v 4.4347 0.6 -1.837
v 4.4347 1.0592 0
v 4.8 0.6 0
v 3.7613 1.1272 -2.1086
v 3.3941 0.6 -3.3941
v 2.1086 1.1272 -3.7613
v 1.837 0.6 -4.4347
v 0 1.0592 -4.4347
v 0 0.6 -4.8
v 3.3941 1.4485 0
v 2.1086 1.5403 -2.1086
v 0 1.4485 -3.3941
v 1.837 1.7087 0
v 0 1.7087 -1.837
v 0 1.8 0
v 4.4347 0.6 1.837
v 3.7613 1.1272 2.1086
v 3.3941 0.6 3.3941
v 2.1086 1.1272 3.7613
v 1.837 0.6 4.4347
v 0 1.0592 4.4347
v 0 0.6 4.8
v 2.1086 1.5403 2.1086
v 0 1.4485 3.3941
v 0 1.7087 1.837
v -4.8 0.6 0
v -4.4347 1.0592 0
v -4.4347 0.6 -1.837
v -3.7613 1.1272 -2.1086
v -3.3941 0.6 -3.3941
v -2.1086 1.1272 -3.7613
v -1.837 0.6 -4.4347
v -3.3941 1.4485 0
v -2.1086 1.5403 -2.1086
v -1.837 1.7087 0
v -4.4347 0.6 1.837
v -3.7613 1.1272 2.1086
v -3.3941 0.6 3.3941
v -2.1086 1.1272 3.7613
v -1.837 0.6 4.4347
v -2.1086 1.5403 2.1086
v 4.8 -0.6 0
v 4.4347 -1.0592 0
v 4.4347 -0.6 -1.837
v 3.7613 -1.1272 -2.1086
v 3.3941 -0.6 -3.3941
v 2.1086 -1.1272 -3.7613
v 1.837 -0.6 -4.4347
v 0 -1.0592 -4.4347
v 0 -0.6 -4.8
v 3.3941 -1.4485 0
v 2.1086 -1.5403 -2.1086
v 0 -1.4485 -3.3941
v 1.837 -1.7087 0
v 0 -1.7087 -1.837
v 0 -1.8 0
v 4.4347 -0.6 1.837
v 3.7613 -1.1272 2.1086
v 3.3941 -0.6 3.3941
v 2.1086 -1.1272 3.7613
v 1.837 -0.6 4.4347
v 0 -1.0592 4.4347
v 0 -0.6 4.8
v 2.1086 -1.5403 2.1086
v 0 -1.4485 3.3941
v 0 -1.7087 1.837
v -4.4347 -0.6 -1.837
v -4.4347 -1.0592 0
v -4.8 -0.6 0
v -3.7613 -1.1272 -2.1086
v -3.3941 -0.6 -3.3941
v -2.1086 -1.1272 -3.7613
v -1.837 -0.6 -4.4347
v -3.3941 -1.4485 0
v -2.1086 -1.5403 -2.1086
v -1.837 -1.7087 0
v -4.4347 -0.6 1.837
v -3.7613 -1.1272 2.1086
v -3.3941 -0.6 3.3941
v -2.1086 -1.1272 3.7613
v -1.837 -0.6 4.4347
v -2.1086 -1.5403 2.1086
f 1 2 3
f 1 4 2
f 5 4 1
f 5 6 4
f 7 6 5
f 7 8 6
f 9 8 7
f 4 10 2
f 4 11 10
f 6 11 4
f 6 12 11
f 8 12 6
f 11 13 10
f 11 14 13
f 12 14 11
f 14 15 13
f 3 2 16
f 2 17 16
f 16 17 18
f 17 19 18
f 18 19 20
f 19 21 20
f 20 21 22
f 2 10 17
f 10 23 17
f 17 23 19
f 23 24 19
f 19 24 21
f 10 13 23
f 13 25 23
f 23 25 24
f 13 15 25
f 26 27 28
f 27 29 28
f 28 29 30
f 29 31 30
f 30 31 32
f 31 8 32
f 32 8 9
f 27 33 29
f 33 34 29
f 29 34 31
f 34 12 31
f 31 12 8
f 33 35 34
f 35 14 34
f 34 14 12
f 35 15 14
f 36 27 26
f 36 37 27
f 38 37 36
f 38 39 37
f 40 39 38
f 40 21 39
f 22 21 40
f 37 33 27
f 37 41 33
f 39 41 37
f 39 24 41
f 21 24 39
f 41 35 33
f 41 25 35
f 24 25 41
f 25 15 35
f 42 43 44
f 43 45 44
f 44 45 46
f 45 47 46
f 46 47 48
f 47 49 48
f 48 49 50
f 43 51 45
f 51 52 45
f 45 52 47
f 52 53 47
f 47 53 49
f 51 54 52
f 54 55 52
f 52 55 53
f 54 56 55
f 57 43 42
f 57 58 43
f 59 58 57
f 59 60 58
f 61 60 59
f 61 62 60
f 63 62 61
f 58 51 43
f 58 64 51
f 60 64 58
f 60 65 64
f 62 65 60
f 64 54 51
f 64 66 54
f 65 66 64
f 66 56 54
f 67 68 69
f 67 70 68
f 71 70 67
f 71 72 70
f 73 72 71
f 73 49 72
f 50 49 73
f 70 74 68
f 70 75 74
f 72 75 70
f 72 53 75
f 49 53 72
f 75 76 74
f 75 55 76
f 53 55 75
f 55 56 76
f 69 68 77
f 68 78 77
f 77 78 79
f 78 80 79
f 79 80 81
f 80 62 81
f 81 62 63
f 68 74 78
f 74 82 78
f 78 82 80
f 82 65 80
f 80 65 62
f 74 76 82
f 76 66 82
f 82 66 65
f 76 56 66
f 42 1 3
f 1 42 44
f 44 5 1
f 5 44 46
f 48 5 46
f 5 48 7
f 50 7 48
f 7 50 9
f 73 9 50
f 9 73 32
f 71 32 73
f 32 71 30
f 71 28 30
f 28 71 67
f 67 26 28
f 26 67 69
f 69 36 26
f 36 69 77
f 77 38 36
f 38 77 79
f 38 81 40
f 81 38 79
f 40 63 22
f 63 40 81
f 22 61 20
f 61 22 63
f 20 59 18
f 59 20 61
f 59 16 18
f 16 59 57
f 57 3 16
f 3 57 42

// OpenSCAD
// file: ../../p/4-4disc.scad
use <../lib.scad>
$fa=1; $fs=0.2;
function ldraw_lib__4_4disc(realsolid=false) = [
// 0 Disc 1.0
// 0 Name: 4-4disc.dat
// 0 Author: James Jessiman
// 0 !LDRAW_ORG Primitive UPDATE 2002-02
// 0 !LICENSE Licensed under CC BY 2.0 and CC BY 4.0 : see CAreadme.txt
// 
// 0 BFC CERTIFY CCW
  [0,"BFC","CERTIFY"],
  [0,"BFC","CCW"],
// 
// 0 !HISTORY 1998-12-15 [PTadmin] Official Update 1998-10
// 0 !HISTORY 2002-03-23 [sbliss] Added BFC statement
// 0 !HISTORY 2002-04-25 [PTadmin] Official Update 2002-02
// 0 !HISTORY 2007-06-24 [PTadmin] Header formatted for Contributor Agreement
// 0 !HISTORY 2008-07-01 [PTadmin] Official Update 2008-01
// 
// 
// 3 16 0 0 0 1 0 0 0.9239 0 0.3827
  [3,16,0,0,0,1,0,0,0.9239,0,0.3827],
// 3 16 0 0 0 0.9239 0 0.3827 0.7071 0 0.7071
  [3,16,0,0,0,0.9239,0,0.3827,0.7071,0,0.7071],
// 3 16 0 0 0 0.7071 0 0.7071 0.3827 0 0.9239
  [3,16,0,0,0,0.7071,0,0.7071,0.3827,0,0.9239],
// 3 16 0 0 0 0.3827 0 0.9239 0 0 1
  [3,16,0,0,0,0.3827,0,0.9239,0,0,1],
// 3 16 0 0 0 0 0 1 -0.3827 0 0.9239
  [3,16,0,0,0,0,0,1,-0.3827,0,0.9239],
// 3 16 0 0 0 -0.3827 0 0.9239 -0.7071 0 0.7071
  [3,16,0,0,0,-0.3827,0,0.9239,-0.7071,0,0.7071],
// 3 16 0 0 0 -0.7071 0 0.7071 -0.9239 0 0.3827
  [3,16,0,0,0,-0.7071,0,0.7071,-0.9239,0,0.3827],
// 3 16 0 0 0 -0.9239 0 0.3827 -1 0 -0
  [3,16,0,0,0,-0.9239,0,0.3827,-1,0,-0],
// 3 16 0 0 0 -1 0 -0 -0.9239 0 -0.3827
  [3,16,0,0,0,-1,0,-0,-0.9239,0,-0.3827],
// 3 16 0 0 0 -0.9239 0 -0.3827 -0.7071 0 -0.7071
  [3,16,0,0,0,-0.9239,0,-0.3827,-0.7071,0,-0.7071],
// 3 16 0 0 0 -0.7071 0 -0.7071 -0.3827 0 -0.9239
  [3,16,0,0,0,-0.7071,0,-0.7071,-0.3827,0,-0.9239],
// 3 16 0 0 0 -0.3827 0 -0.9239 0 0 -1
  [3,16,0,0,0,-0.3827,0,-0.9239,0,0,-1],
// 3 16 0 0 0 0 0 -1 0.3827 0 -0.9239
  [3,16,0,0,0,0,0,-1,0.3827,0,-0.9239],
// 3 16 0 0 0 0.3827 0 -0.9239 0.7071 0 -0.7071
  [3,16,0,0,0,0.3827,0,-0.9239,0.7071,0,-0.7071],
// 3 16 0 0 0 0.7071 0 -0.7071 0.9239 0 -0.3827
  [3,16,0,0,0,0.7071,0,-0.7071,0.9239,0,-0.3827],
// 3 16 0 0 0 0.9239 0 -0.3827 1 0 0
  [3,16,0,0,0,0.9239,0,-0.3827,1,0,0],
// 0
];
module ldraw_lib__4_4disc(step=0, col=false, unit=2/5, alt=false, line=0.2, solid=!$preview)
    makepoly(ldraw_lib__4_4disc(solid), step=step, col=col, unit=unit, alt=alt, line=line, solid=solid);
ldraw_lib__4_4disc(line=0.2);
// file: ../../p/stud3.scad
use <../lib.scad>
use <4-4cyli.scad>
use <4-4disc.scad>
use <4-4edge.scad>
$fa=1; $fs=0.2;
function ldraw_lib__stud3(realsolid=false) = realsolid ? 
    [openscad(translate([0,0,-eps()], o=cylinder(4+eps(), r=4)),2)] : [
// 0 Stud Tube Solid
// 0 Name: stud3.dat
// 0 Author: James Jessiman
// 0 !LDRAW_ORG Primitive UPDATE 2012-01
// 0 !LICENSE Licensed under CC BY 2.0 and CC BY 4.0 : see CAreadme.txt
// 
// 0 BFC CERTIFY CCW
  [0,"BFC","CERTIFY"],
  [0,"BFC","CCW"],
// 
// 0 !HISTORY 2002-04-04 [sbliss] Modified for BFC compliance
// 0 !HISTORY 2002-04-25 [PTadmin] Official Update 2002-02
// 0 !HISTORY 2007-06-24 [PTadmin] Header formatted for Contributor Agreement
// 0 !HISTORY 2008-07-01 [PTadmin] Official Update 2008-01
// 0 !HISTORY 2012-02-16 [Philo] Changed to CCW
// 0 !HISTORY 2012-03-30 [PTadmin] Official Update 2012-01
// 
// 
// 1 16 0 -4 0 4 0 0 0 1 0 0 0 4 4-4edge.dat
  [1,16,0,-4,0,4,0,0,0,1,0,0,0,4, ldraw_lib__4_4edge(realsolid)],
// 1 16 0 0 0 4 0 0 0 1 0 0 0 4 4-4edge.dat
  [1,16,0,0,0,4,0,0,0,1,0,0,0,4, ldraw_lib__4_4edge(realsolid)],
// 1 16 0 -4 0 4 0 0 0 1 0 0 0 4 4-4disc.dat
  [1,16,0,-4,0,4,0,0,0,1,0,0,0,4, ldraw_lib__4_4disc(realsolid)],
// 1 16 0 -4 0 4 0 0 0 4 0 0 0 4 4-4cyli.dat
  [1,16,0,-4,0,4,0,0,0,4,0,0,0,4, ldraw_lib__4_4cyli(realsolid)],
];
module ldraw_lib__stud3(step=0, col=false, unit=2/5, alt=false, line=0.2, solid=!$preview)
    makepoly(ldraw_lib__stud3(solid), step=step, col=col, unit=unit, alt=alt, line=line, solid=solid);
ldraw_lib__stud3(line=0.2);
// file: ../../p/stud.scad
use <../lib.scad>
use <4-4cyli.scad>
use <4-4disc.scad>
use <4-4edge.scad>
$fa=1; $fs=0.2;
function ldraw_lib__stud(realsolid=false) = realsolid ? 
    [openscad(translate([0,0,-eps()], o=cylinder(4+eps(), r=6)),2)] : [
// 0 Stud
// 0 Name: stud.dat
// 0 Author: James Jessiman
// 0 !LDRAW_ORG Primitive UPDATE 2012-01
// 0 !LICENSE Licensed under CC BY 2.0 and CC BY 4.0 : see CAreadme.txt
// 
// 0 BFC CERTIFY CCW
  [0,"BFC","CERTIFY"],
  [0,"BFC","CCW"],
// 
// 0 !HISTORY 2002-04-04 [sbliss] Modified for BFC compliance
// 0 !HISTORY 2002-04-25 [PTadmin] Official Update 2002-02
// 0 !HISTORY 2007-06-24 [PTadmin] Header formatted for Contributor Agreement
// 0 !HISTORY 2008-07-01 [PTadmin] Official Update 2008-01
// 0 !HISTORY 2012-02-16 [Philo] Changed to CCW
// 0 !HISTORY 2012-03-30 [PTadmin] Official Update 2012-01
// 
// 
// 1 16 0 0 0 6 0 0 0 1 0 0 0 6 4-4edge.dat
  [1,16,0,0,0,6,0,0,0,1,0,0,0,6, ldraw_lib__4_4edge(realsolid)],
// 1 16 0 -4 0 6 0 0 0 1 0 0 0 6 4-4edge.dat
  [1,16,0,-4,0,6,0,0,0,1,0,0,0,6, ldraw_lib__4_4edge(realsolid)],
// 1 16 0 0 0 6 0 0 0 -4 0 0 0 6 4-4cyli.dat
  [1,16,0,0,0,6,0,0,0,-4,0,0,0,6, ldraw_lib__4_4cyli(realsolid)],
// 1 16 0 -4 0 6 0 0 0 1 0 0 0 6 4-4disc.dat
  [1,16,0,-4,0,6,0,0,0,1,0,0,0,6, ldraw_lib__4_4disc(realsolid)],
];
module ldraw_lib__stud(step=0, col=false, unit=2/5, alt=false, line=0.2, solid=!$preview)
    makepoly(ldraw_lib__stud(solid), step=step, col=col, unit=unit, alt=alt, line=line, solid=solid);
ldraw_lib__stud(line=0.2);
// file: ../../p/box5.scad
use <../lib.scad>
$fa=1; $fs=0.2;
function ldraw_lib__box5(realsolid=false) = [
// 0 Box with 5 Faces and All Edges
// 0 Name: box5.dat
// 0 Author: James Jessiman
// 0 !LDRAW_ORG Primitive UPDATE 2012-01
// 0 !LICENSE Licensed under CC BY 2.0 and CC BY 4.0 : see CAreadme.txt
// 
// 0 BFC CERTIFY CCW
  [0,"BFC","CERTIFY"],
  [0,"BFC","CCW"],
// 
// 0 !HISTORY 2002-04-03 [sbliss] Modified for BFC compliance
// 0 !HISTORY 2002-04-25 [PTadmin] Official Update 2002-02
// 0 !HISTORY 2007-06-24 [PTadmin] Header formatted for Contributor Agreement
// 0 !HISTORY 2008-07-01 [PTadmin] Official Update 2008-01
// 0 !HISTORY 2012-02-16 [Philo] Changed to CCW
// 0 !HISTORY 2012-03-30 [PTadmin] Official Update 2012-01
// 
// 
// 2 24 1 1 1 -1 1 1
  [2,24,1,1,1,-1,1,1],
// 2 24 -1 1 1 -1 1 -1
  [2,24,-1,1,1,-1,1,-1],
// 2 24 -1 1 -1 1 1 -1
  [2,24,-1,1,-1,1,1,-1],
// 2 24 1 1 -1 1 1 1
  [2,24,1,1,-1,1,1,1],
// 2 24 1 0 1 -1 0 1
  [2,24,1,0,1,-1,0,1],
// 2 24 -1 0 1 -1 0 -1
  [2,24,-1,0,1,-1,0,-1],
// 2 24 -1 0 -1 1 0 -1
  [2,24,-1,0,-1,1,0,-1],
// 2 24 1 0 -1 1 0 1
  [2,24,1,0,-1,1,0,1],
// 2 24 1 0 1 1 1 1
  [2,24,1,0,1,1,1,1],
// 2 24 -1 0 1 -1 1 1
  [2,24,-1,0,1,-1,1,1],
// 2 24 1 0 -1 1 1 -1
  [2,24,1,0,-1,1,1,-1],
// 2 24 -1 0 -1 -1 1 -1
  [2,24,-1,0,-1,-1,1,-1],
// 4 16 -1 1 1 1 1 1 1 1 -1 -1 1 -1
  [4,16,-1,1,1,1,1,1,1,1,-1,-1,1,-1],
// 4 16 -1 1 1 -1 0 1 1 0 1 1 1 1
  [4,16,-1,1,1,-1,0,1,1,0,1,1,1,1],
// 4 16 -1 1 -1 -1 0 -1 -1 0 1 -1 1 1
  [4,16,-1,1,-1,-1,0,-1,-1,0,1,-1,1,1],
// 4 16 1 1 -1 1 0 -1 -1 0 -1 -1 1 -1
  [4,16,1,1,-1,1,0,-1,-1,0,-1,-1,1,-1],
// 4 16 1 1 1 1 0 1 1 0 -1 1 1 -1
  [4,16,1,1,1,1,0,1,1,0,-1,1,1,-1],
];
module ldraw_lib__box5(step=0, col=false, unit=2/5, alt=false, line=0.2, solid=!$preview)
    makepoly(ldraw_lib__box5(solid), step=step, col=col, unit=unit, alt=alt, line=line, solid=solid);
ldraw_lib__box5(line=0.2);
// file: ../../p/box4t.scad
use <../lib.scad>
$fa=1; $fs=0.2;
function ldraw_lib__box4t(realsolid=false) = [
// 0 Box with 4 Adjacent Faces and All Edges
// 0 Name: box4t.dat
// 0 Author: Tore Eriksson [Tore_Eriksson]
// 0 !LDRAW_ORG Primitive UPDATE 2003-02
// 0 !LICENSE Licensed under CC BY 2.0 and CC BY 4.0 : see CAreadme.txt
// 
// 0 BFC CERTIFY CCW
  [0,"BFC","CERTIFY"],
  [0,"BFC","CCW"],
// 
// 0 !HISTORY 1997-09-29 [PTadmin] Official Update 1997-15
// 0 !HISTORY 2002-08-31 [izanette] Modified with WINDZ for BFC compliance
// 0 !HISTORY 2003-08-01 [PTadmin] Official Update 2003-02
// 0 !HISTORY 2007-06-24 [PTadmin] Header formatted for Contributor Agreement
// 0 !HISTORY 2008-07-01 [PTadmin] Official Update 2008-01
// 
// 
// 2 24 1 1 1 -1 1 1
  [2,24,1,1,1,-1,1,1],
// 2 24 -1 1 1 -1 1 -1
  [2,24,-1,1,1,-1,1,-1],
// 2 24 -1 1 -1 1 1 -1
  [2,24,-1,1,-1,1,1,-1],
// 2 24 1 1 -1 1 1 1
  [2,24,1,1,-1,1,1,1],
// 2 24 1 0 1 -1 0 1
  [2,24,1,0,1,-1,0,1],
// 2 24 -1 0 1 -1 0 -1
  [2,24,-1,0,1,-1,0,-1],
// 2 24 -1 0 -1 1 0 -1
  [2,24,-1,0,-1,1,0,-1],
// 2 24 1 0 -1 1 0 1
  [2,24,1,0,-1,1,0,1],
// 2 24 1 0 1 1 1 1
  [2,24,1,0,1,1,1,1],
// 2 24 -1 0 1 -1 1 1
  [2,24,-1,0,1,-1,1,1],
// 2 24 1 0 -1 1 1 -1
  [2,24,1,0,-1,1,1,-1],
// 2 24 -1 0 -1 -1 1 -1
  [2,24,-1,0,-1,-1,1,-1],
// 4 16 1 1 1 1 1 -1 -1 1 -1 -1 1 1
  [4,16,1,1,1,1,1,-1,-1,1,-1,-1,1,1],
// 4 16 1 1 1 -1 1 1 -1 0 1 1 0 1
  [4,16,1,1,1,-1,1,1,-1,0,1,1,0,1],
// 4 16 -1 1 1 -1 1 -1 -1 0 -1 -1 0 1
  [4,16,-1,1,1,-1,1,-1,-1,0,-1,-1,0,1],
// 0 4 16 -1 1 -1 -1 0 -1 1 0 -1 1 1 -1
// 4 16 1 1 -1 1 1 1 1 0 1 1 0 -1
  [4,16,1,1,-1,1,1,1,1,0,1,1,0,-1],
// 0
];
module ldraw_lib__box4t(step=0, col=false, unit=2/5, alt=false, line=0.2, solid=!$preview)
    makepoly(ldraw_lib__box4t(solid), step=step, col=col, unit=unit, alt=alt, line=line, solid=solid);
ldraw_lib__box4t(line=0.2);
// file: 3004s01.scad
use <../../lib.scad>
use <../../p/box4t.scad>
use <../../p/box5.scad>
use <../../p/stud.scad>
use <../../p/stud3.scad>
$fa=1; $fs=0.2;
function ldraw_lib__s__3004s01(realsolid=false) = [
// 0 ~Brick  1 x  2 without Front Face
// 0 Name: s\3004s01.dat
// 0 Author: James Jessiman
// 0 !LDRAW_ORG Subpart UPDATE 2003-03
// 0 !LICENSE Licensed under CC BY 2.0 and CC BY 4.0 : see CAreadme.txt
// 
// 0 BFC CERTIFY CCW
  [0,"BFC","CERTIFY"],
  [0,"BFC","CCW"],
// 
// 0 !HISTORY 2003-09-07 [jriley] Subfiling, BFC
// 0 !HISTORY 2003-12-19 [PTadmin] Official Update 2003-03
// 0 !HISTORY 2007-08-29 [PTadmin] Header formatted for Contributor Agreement
// 0 !HISTORY 2008-07-01 [PTadmin] Official Update 2008-01
// 
// 
// 1 16 0 4 0 1 0 0 0 -5 0 0 0 1 stud3.dat
  [1,16,0,4,0,1,0,0,0,-5,0,0,0,1, ldraw_lib__stud3(realsolid)],
// 0 BFC INVERTNEXT
  [0,"BFC","INVERTNEXT"],
// 1 16 0 24 0 16 0 0 0 -20 0 0 0 6 box5.dat
  [1,16,0,24,0,16,0,0,0,-20,0,0,0,6, ldraw_lib__box5(realsolid)],
// 4 16 20 24 10 16 24 6 -16 24 6 -20 24 10
  [4,16,20,24,10,16,24,6,-16,24,6,-20,24,10],
// 4 16 -20 24 10 -16 24 6 -16 24 -6 -20 24 -10
  [4,16,-20,24,10,-16,24,6,-16,24,-6,-20,24,-10],
// 4 16 -20 24 -10 -16 24 -6 16 24 -6 20 24 -10
  [4,16,-20,24,-10,-16,24,-6,16,24,-6,20,24,-10],
// 4 16 20 24 -10 16 24 -6 16 24 6 20 24 10
  [4,16,20,24,-10,16,24,-6,16,24,6,20,24,10],
// 1 16 0 24 0 20 0 0 0 -24 0 0 0 10 box4t.dat
  [1,16,0,24,0,20,0,0,0,-24,0,0,0,10, ldraw_lib__box4t(realsolid)],
// 1 16 10 0 0 1 0 0 0 1 0 0 0 1 stud.dat
  [1,16,10,0,0,1,0,0,0,1,0,0,0,1, ldraw_lib__stud(realsolid)],
// 1 16 -10 0 0 1 0 0 0 1 0 0 0 1 stud.dat
  [1,16,-10,0,0,1,0,0,0,1,0,0,0,1, ldraw_lib__stud(realsolid)],
// 0
];
module ldraw_lib__s__3004s01(step=0, col=false, unit=2/5, alt=false, line=0.2, solid=!$preview)
    makepoly(ldraw_lib__s__3004s01(solid), step=step, col=col, unit=unit, alt=alt, line=line, solid=solid);
ldraw_lib__s__3004s01(line=0.2);
// file: ../../p/1-8sphe.scad
use <../lib.scad>
$fa=1; $fs=0.2;
function ldraw_lib__1_8sphe(realsolid=false) = [
// 0 Sphere 0.125
// 0 Name: 1-8sphe.dat
// 0 Author: James Jessiman
// 0 !LDRAW_ORG Primitive UPDATE 2012-03
// 0 !LICENSE Licensed under CC BY 2.0 and CC BY 4.0 : see CAreadme.txt
// 
// 0 BFC CERTIFY CCW
  [0,"BFC","CERTIFY"],
  [0,"BFC","CCW"],
// 
// 0 !HISTORY 2000-08-01 {Axel Poque} fixes to resolve L3P error messages.
// 0 !HISTORY 2000-08-01 {Manfred Moolhuysen} fixes to resolve L3P error messages.
// 0 !HISTORY 2000-09-30 [PTadmin] Official Update 2000-02
// 0 !HISTORY 2002-03-28 [hafhead] Made BFC compliant
// 0 !HISTORY 2002-04-25 [PTadmin] Official Update 2002-02
// 0 !HISTORY 2007-06-22 [PTadmin] Header formatted for Contributor Agreement
// 0 !HISTORY 2008-07-01 [PTadmin] Official Update 2008-01
// 0 !HISTORY 2010-09-12 [MagFors] Changed winding, removed duplicated cond-line, optimized filesize
// 0 !HISTORY 2010-12-31 [PTadmin] Official Update 2010-03
// 0 !HISTORY 2012-07-01 [tcobbs] Replaced with geometry from LDView
// 0 !HISTORY 2012-12-28 [PTadmin] Official Update 2012-03
// 
// 
// 3 16 1 0 0 0.9239 0.3827 0 0.9239 0 0.3827
  [3,16,1,0,0,0.9239,0.3827,0,0.9239,0,0.3827],
// 3 16 0.9239 0.3827 0 0.7836 0.4393 0.4393 0.9239 0 0.3827
  [3,16,0.9239,0.3827,0,0.7836,0.4393,0.4393,0.9239,0,0.3827],
// 3 16 0.9239 0 0.3827 0.7836 0.4393 0.4393 0.7071 0 0.7071
  [3,16,0.9239,0,0.3827,0.7836,0.4393,0.4393,0.7071,0,0.7071],
// 3 16 0.7836 0.4393 0.4393 0.4393 0.4393 0.7836 0.7071 0 0.7071
  [3,16,0.7836,0.4393,0.4393,0.4393,0.4393,0.7836,0.7071,0,0.7071],
// 3 16 0.7071 0 0.7071 0.4393 0.4393 0.7836 0.3827 0 0.9239
  [3,16,0.7071,0,0.7071,0.4393,0.4393,0.7836,0.3827,0,0.9239],
// 3 16 0.4393 0.4393 0.7836 0 0.3827 0.9239 0.3827 0 0.9239
  [3,16,0.4393,0.4393,0.7836,0,0.3827,0.9239,0.3827,0,0.9239],
// 3 16 0.3827 0 0.9239 0 0.3827 0.9239 0 0 1
  [3,16,0.3827,0,0.9239,0,0.3827,0.9239,0,0,1],
// 3 16 0.9239 0.3827 0 0.7071 0.7071 0 0.7836 0.4393 0.4393
  [3,16,0.9239,0.3827,0,0.7071,0.7071,0,0.7836,0.4393,0.4393],
// 3 16 0.7071 0.7071 0 0.4393 0.7836 0.4393 0.7836 0.4393 0.4393
  [3,16,0.7071,0.7071,0,0.4393,0.7836,0.4393,0.7836,0.4393,0.4393],
// 3 16 0.7836 0.4393 0.4393 0.4393 0.7836 0.4393 0.4393 0.4393 0.7836
  [3,16,0.7836,0.4393,0.4393,0.4393,0.7836,0.4393,0.4393,0.4393,0.7836],
// 3 16 0.4393 0.7836 0.4393 0 0.7071 0.7071 0.4393 0.4393 0.7836
  [3,16,0.4393,0.7836,0.4393,0,0.7071,0.7071,0.4393,0.4393,0.7836],
// 3 16 0.4393 0.4393 0.7836 0 0.7071 0.7071 0 0.3827 0.9239
  [3,16,0.4393,0.4393,0.7836,0,0.7071,0.7071,0,0.3827,0.9239],
// 3 16 0.7071 0.7071 0 0.3827 0.9239 0 0.4393 0.7836 0.4393
  [3,16,0.7071,0.7071,0,0.3827,0.9239,0,0.4393,0.7836,0.4393],
// 3 16 0.3827 0.9239 0 0 0.9239 0.3827 0.4393 0.7836 0.4393
  [3,16,0.3827,0.9239,0,0,0.9239,0.3827,0.4393,0.7836,0.4393],
// 3 16 0.4393 0.7836 0.4393 0 0.9239 0.3827 0 0.7071 0.7071
  [3,16,0.4393,0.7836,0.4393,0,0.9239,0.3827,0,0.7071,0.7071],
// 3 16 0.3827 0.9239 0 0 1 0 0 0.9239 0.3827
  [3,16,0.3827,0.9239,0,0,1,0,0,0.9239,0.3827],
// 
// 5 24 1 0 0 0.9239 0.3827 0 1 0 -0.1 0.9239 0 0.3827
  [5,24,1,0,0,0.9239,0.3827,0,1,0,-0.1,0.9239,0,0.3827],
// 5 24 0.9239 0.3827 0 0.9239 0 0.3827 1 0 0 0.7836 0.4393 0.4393
  [5,24,0.9239,0.3827,0,0.9239,0,0.3827,1,0,0,0.7836,0.4393,0.4393],
// 5 24 1 0 0 0.9239 0 0.3827 0.9239 0.3827 0 1 -0.1 0
  [5,24,1,0,0,0.9239,0,0.3827,0.9239,0.3827,0,1,-0.1,0],
// 5 24 0.9239 0 0.3827 0.7836 0.4393 0.4393 0.9239 0.3827 0 0.7071 0 0.7071
  [5,24,0.9239,0,0.3827,0.7836,0.4393,0.4393,0.9239,0.3827,0,0.7071,0,0.7071],
// 5 24 0.7836 0.4393 0.4393 0.7071 0 0.7071 0.9239 0 0.3827 0.4393 0.4393 0.7836
  [5,24,0.7836,0.4393,0.4393,0.7071,0,0.7071,0.9239,0,0.3827,0.4393,0.4393,0.7836],
// 5 24 0.9239 0 0.3827 0.7071 0 0.7071 0.7836 0.4393 0.4393 0.9239 -0.1 0.3827
  [5,24,0.9239,0,0.3827,0.7071,0,0.7071,0.7836,0.4393,0.4393,0.9239,-0.1,0.3827],
// 5 24 0.7071 0 0.7071 0.4393 0.4393 0.7836 0.7836 0.4393 0.4393 0.3827 0 0.9239
  [5,24,0.7071,0,0.7071,0.4393,0.4393,0.7836,0.7836,0.4393,0.4393,0.3827,0,0.9239],
// 5 24 0.4393 0.4393 0.7836 0.3827 0 0.9239 0.7071 0 0.7071 0 0.3827 0.9239
  [5,24,0.4393,0.4393,0.7836,0.3827,0,0.9239,0.7071,0,0.7071,0,0.3827,0.9239],
// 5 24 0.7071 0 0.7071 0.3827 0 0.9239 0.4393 0.4393 0.7836 0.7071 -0.1 0.7071
  [5,24,0.7071,0,0.7071,0.3827,0,0.9239,0.4393,0.4393,0.7836,0.7071,-0.1,0.7071],
// 5 24 0.3827 0 0.9239 0 0.3827 0.9239 0.4393 0.4393 0.7836 0 0 1
  [5,24,0.3827,0,0.9239,0,0.3827,0.9239,0.4393,0.4393,0.7836,0,0,1],
// 5 24 0 0.3827 0.9239 0 0 1 0.3827 0 0.9239 -0.1 0.3827 0.9239
  [5,24,0,0.3827,0.9239,0,0,1,0.3827,0,0.9239,-0.1,0.3827,0.9239],
// 5 24 0.3827 0 0.9239 0 0 1 0 0.3827 0.9239 0.3827 -0.1 0.9239
  [5,24,0.3827,0,0.9239,0,0,1,0,0.3827,0.9239,0.3827,-0.1,0.9239],
// 5 24 0.9239 0.3827 0 0.7071 0.7071 0 0.9239 0.3827 -0.1 0.7836 0.4393 0.4393
  [5,24,0.9239,0.3827,0,0.7071,0.7071,0,0.9239,0.3827,-0.1,0.7836,0.4393,0.4393],
// 5 24 0.7071 0.7071 0 0.7836 0.4393 0.4393 0.9239 0.3827 0 0.4393 0.7836 0.4393
  [5,24,0.7071,0.7071,0,0.7836,0.4393,0.4393,0.9239,0.3827,0,0.4393,0.7836,0.4393],
// 5 24 0.9239 0.3827 0 0.7836 0.4393 0.4393 0.7071 0.7071 0 0.9239 0 0.3827
  [5,24,0.9239,0.3827,0,0.7836,0.4393,0.4393,0.7071,0.7071,0,0.9239,0,0.3827],
// 5 24 0.7836 0.4393 0.4393 0.4393 0.7836 0.4393 0.7071 0.7071 0 0.4393 0.4393 0.7836
  [5,24,0.7836,0.4393,0.4393,0.4393,0.7836,0.4393,0.7071,0.7071,0,0.4393,0.4393,0.7836],
// 5 24 0.4393 0.7836 0.4393 0.4393 0.4393 0.7836 0.7836 0.4393 0.4393 0 0.7071 0.7071
  [5,24,0.4393,0.7836,0.4393,0.4393,0.4393,0.7836,0.7836,0.4393,0.4393,0,0.7071,0.7071],
// 5 24 0.7836 0.4393 0.4393 0.4393 0.4393 0.7836 0.4393 0.7836 0.4393 0.7071 0 0.7071
  [5,24,0.7836,0.4393,0.4393,0.4393,0.4393,0.7836,0.4393,0.7836,0.4393,0.7071,0,0.7071],
// 5 24 0.4393 0.4393 0.7836 0 0.7071 0.7071 0.4393 0.7836 0.4393 0 0.3827 0.9239
  [5,24,0.4393,0.4393,0.7836,0,0.7071,0.7071,0.4393,0.7836,0.4393,0,0.3827,0.9239],
// 5 24 0 0.7071 0.7071 0 0.3827 0.9239 0.4393 0.4393 0.7836 -0.1 0.7071 0.7071
  [5,24,0,0.7071,0.7071,0,0.3827,0.9239,0.4393,0.4393,0.7836,-0.1,0.7071,0.7071],
// 5 24 0.4393 0.4393 0.7836 0 0.3827 0.9239 0 0.7071 0.7071 0.3827 0 0.9239
  [5,24,0.4393,0.4393,0.7836,0,0.3827,0.9239,0,0.7071,0.7071,0.3827,0,0.9239],
// 5 24 0.7071 0.7071 0 0.3827 0.9239 0 0.7071 0.7071 -0.1 0.4393 0.7836 0.4393
  [5,24,0.7071,0.7071,0,0.3827,0.9239,0,0.7071,0.7071,-0.1,0.4393,0.7836,0.4393],
// 5 24 0.3827 0.9239 0 0.4393 0.7836 0.4393 0.7071 0.7071 0 0 0.9239 0.3827
  [5,24,0.3827,0.9239,0,0.4393,0.7836,0.4393,0.7071,0.7071,0,0,0.9239,0.3827],
// 5 24 0.7071 0.7071 0 0.4393 0.7836 0.4393 0.3827 0.9239 0 0.7836 0.4393 0.4393
  [5,24,0.7071,0.7071,0,0.4393,0.7836,0.4393,0.3827,0.9239,0,0.7836,0.4393,0.4393],
// 5 24 0.4393 0.7836 0.4393 0 0.9239 0.3827 0.3827 0.9239 0 0 0.7071 0.7071
  [5,24,0.4393,0.7836,0.4393,0,0.9239,0.3827,0.3827,0.9239,0,0,0.7071,0.7071],
// 5 24 0 0.9239 0.3827 0 0.7071 0.7071 0.4393 0.7836 0.4393 -0.1 0.9239 0.3827
  [5,24,0,0.9239,0.3827,0,0.7071,0.7071,0.4393,0.7836,0.4393,-0.1,0.9239,0.3827],
// 5 24 0.4393 0.7836 0.4393 0 0.7071 0.7071 0 0.9239 0.3827 0.4393 0.4393 0.7836
  [5,24,0.4393,0.7836,0.4393,0,0.7071,0.7071,0,0.9239,0.3827,0.4393,0.4393,0.7836],
// 5 24 0.3827 0.9239 0 0 1 0 0.3827 0.9239 -0.1 0 0.9239 0.3827
  [5,24,0.3827,0.9239,0,0,1,0,0.3827,0.9239,-0.1,0,0.9239,0.3827],
// 5 24 0 1 0 0 0.9239 0.3827 0.3827 0.9239 0 -0.1 1 0
  [5,24,0,1,0,0,0.9239,0.3827,0.3827,0.9239,0,-0.1,1,0],
// 5 24 0.3827 0.9239 0 0 0.9239 0.3827 0 1 0 0.4393 0.7836 0.4393
  [5,24,0.3827,0.9239,0,0,0.9239,0.3827,0,1,0,0.4393,0.7836,0.4393],
];
module ldraw_lib__1_8sphe(step=0, col=false, unit=2/5, alt=false, line=0.2, solid=!$preview)
    makepoly(ldraw_lib__1_8sphe(solid), step=step, col=col, unit=unit, alt=alt, line=line, solid=solid);
ldraw_lib__1_8sphe(line=0.2);
// file: ../3004.scad
use <../lib.scad>
use <s/3004s01.scad>
$fa=1; $fs=0.2;
function ldraw_lib__3004(realsolid=false) = [
// 0 Brick  1 x  2
// 0 Name: 3004.dat
// 0 Author: James Jessiman
// 0 !LDRAW_ORG Part UPDATE 2022-05
// 0 !LICENSE Licensed under CC BY 2.0 and CC BY 4.0 : see CAreadme.txt
// 
// 0 BFC CERTIFY CCW
  [0,"BFC","CERTIFY"],
  [0,"BFC","CCW"],
// 
// 0 !HISTORY 2001-10-26 [PTadmin] Official Update 2001-01
// 0 !HISTORY 2002-05-07 {unknown} BFC Certification
// 0 !HISTORY 2002-06-11 [PTadmin] Official Update 2002-03
// 0 !HISTORY 2007-05-07 [PTadmin] Header formatted for Contributor Agreement
// 0 !HISTORY 2008-07-01 [PTadmin] Official Update 2008-01
// 0 !HISTORY 2022-08-04 [MagFors] Using subfile
// 0 !HISTORY 2022-09-15 [PTadmin] Official Update 2022-05
// 
// 
// 1 16 0 0 0 1 0 0 0 1 0 0 0 1 s\3004s01.dat
  [1,16,0,0,0,1,0,0,0,1,0,0,0,1, ldraw_lib__s__3004s01(realsolid)],
// 4 16 -20 24 -10 20 24 -10 20 0 -10 -20 0 -10
  [4,16,-20,24,-10,20,24,-10,20,0,-10,-20,0,-10],
];
module ldraw_lib__3004(step=0, col=false, unit=2/5, alt=false, line=0.2, solid=!$preview)
    makepoly(ldraw_lib__3004(solid), step=step, col=col, unit=unit, alt=alt, line=line, solid=solid);
ldraw_lib__3004(line=0.2);
// file: ../../p/4-8sphe.scad
use <../lib.scad>
use <1-8sphe.scad>
$fa=1; $fs=0.2;
function ldraw_lib__4_8sphe(realsolid=false) = [
// 0 Sphere 0.5
// 0 Name: 4-8sphe.dat
// 0 Author: James Jessiman
// 0 !LDRAW_ORG Primitive UPDATE 2003-02
// 0 !LICENSE Licensed under CC BY 2.0 and CC BY 4.0 : see CAreadme.txt
// 
// 0 BFC CERTIFY CCW
  [0,"BFC","CERTIFY"],
  [0,"BFC","CCW"],
// 
// 0 !HISTORY 2002-08-31 [izanette] Modified with WINDZ for BFC compliance
// 0 !HISTORY 2003-08-01 [PTadmin] Official Update 2003-02
// 0 !HISTORY 2007-06-24 [PTadmin] Header formatted for Contributor Agreement
// 0 !HISTORY 2008-07-01 [PTadmin] Official Update 2008-01
// 
// 
// 1 16 0 0 0 1 0 0 0 1 0 0 0 1 1-8sphe.dat
  [1,16,0,0,0,1,0,0,0,1,0,0,0,1, ldraw_lib__1_8sphe(realsolid)],
// 1 16 0 0 0 1 0 0 0 1 0 0 0 -1 1-8sphe.dat
  [1,16,0,0,0,1,0,0,0,1,0,0,0,-1, ldraw_lib__1_8sphe(realsolid)],
// 1 16 0 0 0 -1 0 0 0 1 0 0 0 1 1-8sphe.dat
  [1,16,0,0,0,-1,0,0,0,1,0,0,0,1, ldraw_lib__1_8sphe(realsolid)],
// 1 16 0 0 0 -1 0 0 0 1 0 0 0 -1 1-8sphe.dat
  [1,16,0,0,0,-1,0,0,0,1,0,0,0,-1, ldraw_lib__1_8sphe(realsolid)],
// 0
// 
];
module ldraw_lib__4_8sphe(step=0, col=false, unit=2/5, alt=false, line=0.2, solid=!$preview)
    makepoly(ldraw_lib__4_8sphe(solid), step=step, col=col, unit=unit, alt=alt, line=line, solid=solid);
ldraw_lib__4_8sphe(line=0.2);
// file: ../../p/4-4edge.scad
use <../lib.scad>
$fa=1; $fs=0.2;
function ldraw_lib__4_4edge(realsolid=false) = [
// 0 Circle 1.0
// 0 Name: 4-4edge.dat
// 0 Author: James Jessiman
// 0 !LDRAW_ORG Primitive UPDATE 2017-01
// 0 !LICENSE Licensed under CC BY 2.0 and CC BY 4.0 : see CAreadme.txt
// 
// 0 BFC CERTIFY CCW
  [0,"BFC","CERTIFY"],
  [0,"BFC","CCW"],
// 
// 0 !HISTORY 1998-12-15 [PTadmin] Official Update 1998-10
// 0 !HISTORY 2005-12-28 [PTadmin] Official Update 2005-01
// 0 !HISTORY 2007-06-24 [PTadmin] Header formatted for Contributor Agreement
// 0 !HISTORY 2008-07-01 [PTadmin] Official Update 2008-01
// 0 !HISTORY 2017-01-15 [Steffen] BFCed
// 0 !HISTORY 2017-12-30 [PTadmin] Official Update 2017-01
// 
// 
// 2 24 1 0 0 0.9239 0 0.3827
  [2,24,1,0,0,0.9239,0,0.3827],
// 2 24 0.9239 0 0.3827 0.7071 0 0.7071
  [2,24,0.9239,0,0.3827,0.7071,0,0.7071],
// 2 24 0.7071 0 0.7071 0.3827 0 0.9239
  [2,24,0.7071,0,0.7071,0.3827,0,0.9239],
// 2 24 0.3827 0 0.9239 0 0 1
  [2,24,0.3827,0,0.9239,0,0,1],
// 2 24 0 0 1 -0.3827 0 0.9239
  [2,24,0,0,1,-0.3827,0,0.9239],
// 2 24 -0.3827 0 0.9239 -0.7071 0 0.7071
  [2,24,-0.3827,0,0.9239,-0.7071,0,0.7071],
// 2 24 -0.7071 0 0.7071 -0.9239 0 0.3827
  [2,24,-0.7071,0,0.7071,-0.9239,0,0.3827],
// 2 24 -0.9239 0 0.3827 -1 0 -0
  [2,24,-0.9239,0,0.3827,-1,0,-0],
// 2 24 -1 0 -0 -0.9239 0 -0.3827
  [2,24,-1,0,-0,-0.9239,0,-0.3827],
// 2 24 -0.9239 0 -0.3827 -0.7071 0 -0.7071
  [2,24,-0.9239,0,-0.3827,-0.7071,0,-0.7071],
// 2 24 -0.7071 0 -0.7071 -0.3827 0 -0.9239
  [2,24,-0.7071,0,-0.7071,-0.3827,0,-0.9239],
// 2 24 -0.3827 0 -0.9239 0 0 -1
  [2,24,-0.3827,0,-0.9239,0,0,-1],
// 2 24 0 0 -1 0.3827 0 -0.9239
  [2,24,0,0,-1,0.3827,0,-0.9239],
// 2 24 0.3827 0 -0.9239 0.7071 0 -0.7071
  [2,24,0.3827,0,-0.9239,0.7071,0,-0.7071],
// 2 24 0.7071 0 -0.7071 0.9239 0 -0.3827
  [2,24,0.7071,0,-0.7071,0.9239,0,-0.3827],
// 2 24 0.9239 0 -0.3827 1 0 0
  [2,24,0.9239,0,-0.3827,1,0,0],
];
module ldraw_lib__4_4edge(step=0, col=false, unit=2/5, alt=false, line=0.2, solid=!$preview)
    makepoly(ldraw_lib__4_4edge(solid), step=step, col=col, unit=unit, alt=alt, line=line, solid=solid);
ldraw_lib__4_4edge(line=0.2);
// file: ../../p/4-4cyli.scad
use <../lib.scad>
$fa=1; $fs=0.2;
function ldraw_lib__4_4cyli(realsolid=false) = [
// 0 Cylinder 1.0
// 0 Name: 4-4cyli.dat
// 0 Author: James Jessiman
// 0 !LDRAW_ORG Primitive UPDATE 2005-01
// 0 !LICENSE Licensed under CC BY 2.0 and CC BY 4.0 : see CAreadme.txt
// 
// 0 BFC CERTIFY CCW
  [0,"BFC","CERTIFY"],
  [0,"BFC","CCW"],
// 
// 0 !HISTORY 1998-12-15 [PTadmin] Official Update 1998-10
// 0 !HISTORY 2002-03-23 [sbliss] Added BFC statement; merged headers from files in distributions LDraw 0.27 and Complete.
// 0 !HISTORY 2002-04-25 [PTadmin] Official Update 2002-02
// 0 !HISTORY 2004-12-14 [guyvivan] BFC CCW
// 0 !HISTORY 2005-12-28 [PTadmin] Official Update 2005-01
// 0 !HISTORY 2007-06-24 [PTadmin] Header formatted for Contributor Agreement
// 0 !HISTORY 2008-07-01 [PTadmin] Official Update 2008-01
// 
// 
// 4 16 1 1 0 0.9239 1 0.3827 0.9239 0 0.3827 1 0 0
  [4,16,1,1,0,0.9239,1,0.3827,0.9239,0,0.3827,1,0,0],
// 5 24 1 0 0 1 1 0 0.9239 0 0.3827 0.9239 0 -0.3827
  [5,24,1,0,0,1,1,0,0.9239,0,0.3827,0.9239,0,-0.3827],
// 4 16 0.9239 1 0.3827 0.7071 1 0.7071 0.7071 0 0.7071 0.9239 0 0.3827
  [4,16,0.9239,1,0.3827,0.7071,1,0.7071,0.7071,0,0.7071,0.9239,0,0.3827],
// 5 24 0.9239 0 0.3827 0.9239 1 0.3827 0.7071 0 0.7071 1 0 0
  [5,24,0.9239,0,0.3827,0.9239,1,0.3827,0.7071,0,0.7071,1,0,0],
// 4 16 0.7071 1 0.7071 0.3827 1 0.9239 0.3827 0 0.9239 0.7071 0 0.7071
  [4,16,0.7071,1,0.7071,0.3827,1,0.9239,0.3827,0,0.9239,0.7071,0,0.7071],
// 5 24 0.7071 0 0.7071 0.7071 1 0.7071 0.3827 0 0.9239 0.9239 0 0.3827
  [5,24,0.7071,0,0.7071,0.7071,1,0.7071,0.3827,0,0.9239,0.9239,0,0.3827],
// 4 16 0.3827 1 0.9239 0 1 1 0 0 1 0.3827 0 0.9239
  [4,16,0.3827,1,0.9239,0,1,1,0,0,1,0.3827,0,0.9239],
// 5 24 0.3827 0 0.9239 0.3827 1 0.9239 0 0 1 0.7071 0 0.7071
  [5,24,0.3827,0,0.9239,0.3827,1,0.9239,0,0,1,0.7071,0,0.7071],
// 4 16 0 1 1 -0.3827 1 0.9239 -0.3827 0 0.9239 0 0 1
  [4,16,0,1,1,-0.3827,1,0.9239,-0.3827,0,0.9239,0,0,1],
// 5 24 0 0 1 0 1 1 -0.3827 0 0.9239 0.3827 0 0.9239
  [5,24,0,0,1,0,1,1,-0.3827,0,0.9239,0.3827,0,0.9239],
// 4 16 -0.3827 1 0.9239 -0.7071 1 0.7071 -0.7071 0 0.7071 -0.3827 0 0.9239
  [4,16,-0.3827,1,0.9239,-0.7071,1,0.7071,-0.7071,0,0.7071,-0.3827,0,0.9239],
// 5 24 -0.3827 0 0.9239 -0.3827 1 0.9239 -0.7071 0 0.7071 0 0 1
  [5,24,-0.3827,0,0.9239,-0.3827,1,0.9239,-0.7071,0,0.7071,0,0,1],
// 4 16 -0.7071 1 0.7071 -0.9239 1 0.3827 -0.9239 0 0.3827 -0.7071 0 0.7071
  [4,16,-0.7071,1,0.7071,-0.9239,1,0.3827,-0.9239,0,0.3827,-0.7071,0,0.7071],
// 5 24 -0.7071 0 0.7071 -0.7071 1 0.7071 -0.9239 0 0.3827 -0.3827 0 0.9239
  [5,24,-0.7071,0,0.7071,-0.7071,1,0.7071,-0.9239,0,0.3827,-0.3827,0,0.9239],
// 4 16 -0.9239 1 0.3827 -1 1 0 -1 0 0 -0.9239 0 0.3827
  [4,16,-0.9239,1,0.3827,-1,1,0,-1,0,0,-0.9239,0,0.3827],
// 5 24 -0.9239 0 0.3827 -0.9239 1 0.3827 -1 0 0 -0.7071 0 0.7071
  [5,24,-0.9239,0,0.3827,-0.9239,1,0.3827,-1,0,0,-0.7071,0,0.7071],
// 4 16 -1 1 0 -0.9239 1 -0.3827 -0.9239 0 -0.3827 -1 0 0
  [4,16,-1,1,0,-0.9239,1,-0.3827,-0.9239,0,-0.3827,-1,0,0],
// 5 24 -1 0 0 -1 1 0 -0.9239 0 -0.3827 -0.9239 0 0.3827
  [5,24,-1,0,0,-1,1,0,-0.9239,0,-0.3827,-0.9239,0,0.3827],
// 4 16 -0.9239 1 -0.3827 -0.7071 1 -0.7071 -0.7071 0 -0.7071 -0.9239 0 -0.3827
  [4,16,-0.9239,1,-0.3827,-0.7071,1,-0.7071,-0.7071,0,-0.7071,-0.9239,0,-0.3827],
// 5 24 -0.9239 0 -0.3827 -0.9239 1 -0.3827 -0.7071 0 -0.7071 -1 0 0
  [5,24,-0.9239,0,-0.3827,-0.9239,1,-0.3827,-0.7071,0,-0.7071,-1,0,0],
// 4 16 -0.7071 1 -0.7071 -0.3827 1 -0.9239 -0.3827 0 -0.9239 -0.7071 0 -0.7071
  [4,16,-0.7071,1,-0.7071,-0.3827,1,-0.9239,-0.3827,0,-0.9239,-0.7071,0,-0.7071],
// 5 24 -0.7071 0 -0.7071 -0.7071 1 -0.7071 -0.3827 0 -0.9239 -0.9239 0 -0.3827
  [5,24,-0.7071,0,-0.7071,-0.7071,1,-0.7071,-0.3827,0,-0.9239,-0.9239,0,-0.3827],
// 4 16 -0.3827 1 -0.9239 0 1 -1 0 0 -1 -0.3827 0 -0.9239
  [4,16,-0.3827,1,-0.9239,0,1,-1,0,0,-1,-0.3827,0,-0.9239],
// 5 24 -0.3827 0 -0.9239 -0.3827 1 -0.9239 0 0 -1 -0.7071 0 -0.7071
  [5,24,-0.3827,0,-0.9239,-0.3827,1,-0.9239,0,0,-1,-0.7071,0,-0.7071],
// 4 16 0 1 -1 0.3827 1 -0.9239 0.3827 0 -0.9239 0 0 -1
  [4,16,0,1,-1,0.3827,1,-0.9239,0.3827,0,-0.9239,0,0,-1],
// 5 24 0 0 -1 0 1 -1 0.3827 0 -0.9239 -0.3827 0 -0.9239
  [5,24,0,0,-1,0,1,-1,0.3827,0,-0.9239,-0.3827,0,-0.9239],
// 4 16 0.3827 1 -0.9239 0.7071 1 -0.7071 0.7071 0 -0.7071 0.3827 0 -0.9239
  [4,16,0.3827,1,-0.9239,0.7071,1,-0.7071,0.7071,0,-0.7071,0.3827,0,-0.9239],
// 5 24 0.3827 0 -0.9239 0.3827 1 -0.9239 0.7071 0 -0.7071 0 0 -1
  [5,24,0.3827,0,-0.9239,0.3827,1,-0.9239,0.7071,0,-0.7071,0,0,-1],
// 4 16 0.7071 1 -0.7071 0.9239 1 -0.3827 0.9239 0 -0.3827 0.7071 0 -0.7071
  [4,16,0.7071,1,-0.7071,0.9239,1,-0.3827,0.9239,0,-0.3827,0.7071,0,-0.7071],
// 5 24 0.7071 0 -0.7071 0.7071 1 -0.7071 0.9239 0 -0.3827 0.3827 0 -0.9239
  [5,24,0.7071,0,-0.7071,0.7071,1,-0.7071,0.9239,0,-0.3827,0.3827,0,-0.9239],
// 4 16 0.9239 1 -0.3827 1 1 0 1 0 0 0.9239 0 -0.3827
  [4,16,0.9239,1,-0.3827,1,1,0,1,0,0,0.9239,0,-0.3827],
// 5 24 0.9239 0 -0.3827 0.9239 1 -0.3827 1 0 0 0.7071 0 -0.7071
  [5,24,0.9239,0,-0.3827,0.9239,1,-0.3827,1,0,0,0.7071,0,-0.7071],
// 0
];
module ldraw_lib__4_4cyli(step=0, col=false, unit=2/5, alt=false, line=0.2, solid=!$preview)
    makepoly(ldraw_lib__4_4cyli(solid), step=step, col=col, unit=unit, alt=alt, line=line, solid=solid);
ldraw_lib__4_4cyli(line=0.2);
// main file
use <../../lib.scad>
use <../../p/4-4cyli.scad>
use <../../p/4-4edge.scad>
use <../../p/4-8sphe.scad>
$fa=1; $fs=0.2;
function ldraw_lib__s__30152s01(realsolid=false) = [
// 0 ~Lens for Minifig Tool Magnifying Glass (Obsolete)
// 0 Name: s\30152s01.dat
// 0 Author: Michael Heidemann [mikeheide]
// 0 !LDRAW_ORG Subpart UPDATE 2020-02
// 0 !LICENSE Licensed under CC BY 2.0 and CC BY 4.0 : see CAreadme.txt
// 
// 0 BFC CERTIFY CCW
  [0,"BFC","CERTIFY"],
  [0,"BFC","CCW"],
// 
// 0 !HISTORY 2008-11-15 [mikeheide] creation, based on the code of Jonathan Wilson
// 0 !HISTORY 2020-09-05 [PTadmin] Official Update 2020-02
// 
// 
// 1 16 0 0 1.5 12 0 0 0 0 12 0 3 0 4-8sphe.dat
  [1,16,0,0,1.5,12,0,0,0,0,12,0,3,0, ldraw_lib__4_8sphe(realsolid)],
// 1 16 0 0 -1.5 12 0 0 0 0 12 0 -3 0 4-8sphe.dat
  [1,16,0,0,-1.5,12,0,0,0,0,12,0,-3,0, ldraw_lib__4_8sphe(realsolid)],
// 1 16 0 0 1.5 12 0 0 0 0 12 0 1 0 4-4edge.dat
  [1,16,0,0,1.5,12,0,0,0,0,12,0,1,0, ldraw_lib__4_4edge(realsolid)],
// 1 16 0 0 1.5 12 0 0 0 0 12 0 -3 0 4-4cyli.dat
  [1,16,0,0,1.5,12,0,0,0,0,12,0,-3,0, ldraw_lib__4_4cyli(realsolid)],
// 1 16 0 0 -1.5 12 0 0 0 0 12 0 1 0 4-4edge.dat
  [1,16,0,0,-1.5,12,0,0,0,0,12,0,1,0, ldraw_lib__4_4edge(realsolid)],
];
module ldraw_lib__s__30152s01(step=0, col=false, unit=2/5, alt=false, line=0.2, solid=!$preview)
    makepoly(ldraw_lib__s__30152s01(solid), step=step, col=col, unit=unit, alt=alt, line=line, solid=solid);
ldraw_lib__s__30152s01(line=0.2);
